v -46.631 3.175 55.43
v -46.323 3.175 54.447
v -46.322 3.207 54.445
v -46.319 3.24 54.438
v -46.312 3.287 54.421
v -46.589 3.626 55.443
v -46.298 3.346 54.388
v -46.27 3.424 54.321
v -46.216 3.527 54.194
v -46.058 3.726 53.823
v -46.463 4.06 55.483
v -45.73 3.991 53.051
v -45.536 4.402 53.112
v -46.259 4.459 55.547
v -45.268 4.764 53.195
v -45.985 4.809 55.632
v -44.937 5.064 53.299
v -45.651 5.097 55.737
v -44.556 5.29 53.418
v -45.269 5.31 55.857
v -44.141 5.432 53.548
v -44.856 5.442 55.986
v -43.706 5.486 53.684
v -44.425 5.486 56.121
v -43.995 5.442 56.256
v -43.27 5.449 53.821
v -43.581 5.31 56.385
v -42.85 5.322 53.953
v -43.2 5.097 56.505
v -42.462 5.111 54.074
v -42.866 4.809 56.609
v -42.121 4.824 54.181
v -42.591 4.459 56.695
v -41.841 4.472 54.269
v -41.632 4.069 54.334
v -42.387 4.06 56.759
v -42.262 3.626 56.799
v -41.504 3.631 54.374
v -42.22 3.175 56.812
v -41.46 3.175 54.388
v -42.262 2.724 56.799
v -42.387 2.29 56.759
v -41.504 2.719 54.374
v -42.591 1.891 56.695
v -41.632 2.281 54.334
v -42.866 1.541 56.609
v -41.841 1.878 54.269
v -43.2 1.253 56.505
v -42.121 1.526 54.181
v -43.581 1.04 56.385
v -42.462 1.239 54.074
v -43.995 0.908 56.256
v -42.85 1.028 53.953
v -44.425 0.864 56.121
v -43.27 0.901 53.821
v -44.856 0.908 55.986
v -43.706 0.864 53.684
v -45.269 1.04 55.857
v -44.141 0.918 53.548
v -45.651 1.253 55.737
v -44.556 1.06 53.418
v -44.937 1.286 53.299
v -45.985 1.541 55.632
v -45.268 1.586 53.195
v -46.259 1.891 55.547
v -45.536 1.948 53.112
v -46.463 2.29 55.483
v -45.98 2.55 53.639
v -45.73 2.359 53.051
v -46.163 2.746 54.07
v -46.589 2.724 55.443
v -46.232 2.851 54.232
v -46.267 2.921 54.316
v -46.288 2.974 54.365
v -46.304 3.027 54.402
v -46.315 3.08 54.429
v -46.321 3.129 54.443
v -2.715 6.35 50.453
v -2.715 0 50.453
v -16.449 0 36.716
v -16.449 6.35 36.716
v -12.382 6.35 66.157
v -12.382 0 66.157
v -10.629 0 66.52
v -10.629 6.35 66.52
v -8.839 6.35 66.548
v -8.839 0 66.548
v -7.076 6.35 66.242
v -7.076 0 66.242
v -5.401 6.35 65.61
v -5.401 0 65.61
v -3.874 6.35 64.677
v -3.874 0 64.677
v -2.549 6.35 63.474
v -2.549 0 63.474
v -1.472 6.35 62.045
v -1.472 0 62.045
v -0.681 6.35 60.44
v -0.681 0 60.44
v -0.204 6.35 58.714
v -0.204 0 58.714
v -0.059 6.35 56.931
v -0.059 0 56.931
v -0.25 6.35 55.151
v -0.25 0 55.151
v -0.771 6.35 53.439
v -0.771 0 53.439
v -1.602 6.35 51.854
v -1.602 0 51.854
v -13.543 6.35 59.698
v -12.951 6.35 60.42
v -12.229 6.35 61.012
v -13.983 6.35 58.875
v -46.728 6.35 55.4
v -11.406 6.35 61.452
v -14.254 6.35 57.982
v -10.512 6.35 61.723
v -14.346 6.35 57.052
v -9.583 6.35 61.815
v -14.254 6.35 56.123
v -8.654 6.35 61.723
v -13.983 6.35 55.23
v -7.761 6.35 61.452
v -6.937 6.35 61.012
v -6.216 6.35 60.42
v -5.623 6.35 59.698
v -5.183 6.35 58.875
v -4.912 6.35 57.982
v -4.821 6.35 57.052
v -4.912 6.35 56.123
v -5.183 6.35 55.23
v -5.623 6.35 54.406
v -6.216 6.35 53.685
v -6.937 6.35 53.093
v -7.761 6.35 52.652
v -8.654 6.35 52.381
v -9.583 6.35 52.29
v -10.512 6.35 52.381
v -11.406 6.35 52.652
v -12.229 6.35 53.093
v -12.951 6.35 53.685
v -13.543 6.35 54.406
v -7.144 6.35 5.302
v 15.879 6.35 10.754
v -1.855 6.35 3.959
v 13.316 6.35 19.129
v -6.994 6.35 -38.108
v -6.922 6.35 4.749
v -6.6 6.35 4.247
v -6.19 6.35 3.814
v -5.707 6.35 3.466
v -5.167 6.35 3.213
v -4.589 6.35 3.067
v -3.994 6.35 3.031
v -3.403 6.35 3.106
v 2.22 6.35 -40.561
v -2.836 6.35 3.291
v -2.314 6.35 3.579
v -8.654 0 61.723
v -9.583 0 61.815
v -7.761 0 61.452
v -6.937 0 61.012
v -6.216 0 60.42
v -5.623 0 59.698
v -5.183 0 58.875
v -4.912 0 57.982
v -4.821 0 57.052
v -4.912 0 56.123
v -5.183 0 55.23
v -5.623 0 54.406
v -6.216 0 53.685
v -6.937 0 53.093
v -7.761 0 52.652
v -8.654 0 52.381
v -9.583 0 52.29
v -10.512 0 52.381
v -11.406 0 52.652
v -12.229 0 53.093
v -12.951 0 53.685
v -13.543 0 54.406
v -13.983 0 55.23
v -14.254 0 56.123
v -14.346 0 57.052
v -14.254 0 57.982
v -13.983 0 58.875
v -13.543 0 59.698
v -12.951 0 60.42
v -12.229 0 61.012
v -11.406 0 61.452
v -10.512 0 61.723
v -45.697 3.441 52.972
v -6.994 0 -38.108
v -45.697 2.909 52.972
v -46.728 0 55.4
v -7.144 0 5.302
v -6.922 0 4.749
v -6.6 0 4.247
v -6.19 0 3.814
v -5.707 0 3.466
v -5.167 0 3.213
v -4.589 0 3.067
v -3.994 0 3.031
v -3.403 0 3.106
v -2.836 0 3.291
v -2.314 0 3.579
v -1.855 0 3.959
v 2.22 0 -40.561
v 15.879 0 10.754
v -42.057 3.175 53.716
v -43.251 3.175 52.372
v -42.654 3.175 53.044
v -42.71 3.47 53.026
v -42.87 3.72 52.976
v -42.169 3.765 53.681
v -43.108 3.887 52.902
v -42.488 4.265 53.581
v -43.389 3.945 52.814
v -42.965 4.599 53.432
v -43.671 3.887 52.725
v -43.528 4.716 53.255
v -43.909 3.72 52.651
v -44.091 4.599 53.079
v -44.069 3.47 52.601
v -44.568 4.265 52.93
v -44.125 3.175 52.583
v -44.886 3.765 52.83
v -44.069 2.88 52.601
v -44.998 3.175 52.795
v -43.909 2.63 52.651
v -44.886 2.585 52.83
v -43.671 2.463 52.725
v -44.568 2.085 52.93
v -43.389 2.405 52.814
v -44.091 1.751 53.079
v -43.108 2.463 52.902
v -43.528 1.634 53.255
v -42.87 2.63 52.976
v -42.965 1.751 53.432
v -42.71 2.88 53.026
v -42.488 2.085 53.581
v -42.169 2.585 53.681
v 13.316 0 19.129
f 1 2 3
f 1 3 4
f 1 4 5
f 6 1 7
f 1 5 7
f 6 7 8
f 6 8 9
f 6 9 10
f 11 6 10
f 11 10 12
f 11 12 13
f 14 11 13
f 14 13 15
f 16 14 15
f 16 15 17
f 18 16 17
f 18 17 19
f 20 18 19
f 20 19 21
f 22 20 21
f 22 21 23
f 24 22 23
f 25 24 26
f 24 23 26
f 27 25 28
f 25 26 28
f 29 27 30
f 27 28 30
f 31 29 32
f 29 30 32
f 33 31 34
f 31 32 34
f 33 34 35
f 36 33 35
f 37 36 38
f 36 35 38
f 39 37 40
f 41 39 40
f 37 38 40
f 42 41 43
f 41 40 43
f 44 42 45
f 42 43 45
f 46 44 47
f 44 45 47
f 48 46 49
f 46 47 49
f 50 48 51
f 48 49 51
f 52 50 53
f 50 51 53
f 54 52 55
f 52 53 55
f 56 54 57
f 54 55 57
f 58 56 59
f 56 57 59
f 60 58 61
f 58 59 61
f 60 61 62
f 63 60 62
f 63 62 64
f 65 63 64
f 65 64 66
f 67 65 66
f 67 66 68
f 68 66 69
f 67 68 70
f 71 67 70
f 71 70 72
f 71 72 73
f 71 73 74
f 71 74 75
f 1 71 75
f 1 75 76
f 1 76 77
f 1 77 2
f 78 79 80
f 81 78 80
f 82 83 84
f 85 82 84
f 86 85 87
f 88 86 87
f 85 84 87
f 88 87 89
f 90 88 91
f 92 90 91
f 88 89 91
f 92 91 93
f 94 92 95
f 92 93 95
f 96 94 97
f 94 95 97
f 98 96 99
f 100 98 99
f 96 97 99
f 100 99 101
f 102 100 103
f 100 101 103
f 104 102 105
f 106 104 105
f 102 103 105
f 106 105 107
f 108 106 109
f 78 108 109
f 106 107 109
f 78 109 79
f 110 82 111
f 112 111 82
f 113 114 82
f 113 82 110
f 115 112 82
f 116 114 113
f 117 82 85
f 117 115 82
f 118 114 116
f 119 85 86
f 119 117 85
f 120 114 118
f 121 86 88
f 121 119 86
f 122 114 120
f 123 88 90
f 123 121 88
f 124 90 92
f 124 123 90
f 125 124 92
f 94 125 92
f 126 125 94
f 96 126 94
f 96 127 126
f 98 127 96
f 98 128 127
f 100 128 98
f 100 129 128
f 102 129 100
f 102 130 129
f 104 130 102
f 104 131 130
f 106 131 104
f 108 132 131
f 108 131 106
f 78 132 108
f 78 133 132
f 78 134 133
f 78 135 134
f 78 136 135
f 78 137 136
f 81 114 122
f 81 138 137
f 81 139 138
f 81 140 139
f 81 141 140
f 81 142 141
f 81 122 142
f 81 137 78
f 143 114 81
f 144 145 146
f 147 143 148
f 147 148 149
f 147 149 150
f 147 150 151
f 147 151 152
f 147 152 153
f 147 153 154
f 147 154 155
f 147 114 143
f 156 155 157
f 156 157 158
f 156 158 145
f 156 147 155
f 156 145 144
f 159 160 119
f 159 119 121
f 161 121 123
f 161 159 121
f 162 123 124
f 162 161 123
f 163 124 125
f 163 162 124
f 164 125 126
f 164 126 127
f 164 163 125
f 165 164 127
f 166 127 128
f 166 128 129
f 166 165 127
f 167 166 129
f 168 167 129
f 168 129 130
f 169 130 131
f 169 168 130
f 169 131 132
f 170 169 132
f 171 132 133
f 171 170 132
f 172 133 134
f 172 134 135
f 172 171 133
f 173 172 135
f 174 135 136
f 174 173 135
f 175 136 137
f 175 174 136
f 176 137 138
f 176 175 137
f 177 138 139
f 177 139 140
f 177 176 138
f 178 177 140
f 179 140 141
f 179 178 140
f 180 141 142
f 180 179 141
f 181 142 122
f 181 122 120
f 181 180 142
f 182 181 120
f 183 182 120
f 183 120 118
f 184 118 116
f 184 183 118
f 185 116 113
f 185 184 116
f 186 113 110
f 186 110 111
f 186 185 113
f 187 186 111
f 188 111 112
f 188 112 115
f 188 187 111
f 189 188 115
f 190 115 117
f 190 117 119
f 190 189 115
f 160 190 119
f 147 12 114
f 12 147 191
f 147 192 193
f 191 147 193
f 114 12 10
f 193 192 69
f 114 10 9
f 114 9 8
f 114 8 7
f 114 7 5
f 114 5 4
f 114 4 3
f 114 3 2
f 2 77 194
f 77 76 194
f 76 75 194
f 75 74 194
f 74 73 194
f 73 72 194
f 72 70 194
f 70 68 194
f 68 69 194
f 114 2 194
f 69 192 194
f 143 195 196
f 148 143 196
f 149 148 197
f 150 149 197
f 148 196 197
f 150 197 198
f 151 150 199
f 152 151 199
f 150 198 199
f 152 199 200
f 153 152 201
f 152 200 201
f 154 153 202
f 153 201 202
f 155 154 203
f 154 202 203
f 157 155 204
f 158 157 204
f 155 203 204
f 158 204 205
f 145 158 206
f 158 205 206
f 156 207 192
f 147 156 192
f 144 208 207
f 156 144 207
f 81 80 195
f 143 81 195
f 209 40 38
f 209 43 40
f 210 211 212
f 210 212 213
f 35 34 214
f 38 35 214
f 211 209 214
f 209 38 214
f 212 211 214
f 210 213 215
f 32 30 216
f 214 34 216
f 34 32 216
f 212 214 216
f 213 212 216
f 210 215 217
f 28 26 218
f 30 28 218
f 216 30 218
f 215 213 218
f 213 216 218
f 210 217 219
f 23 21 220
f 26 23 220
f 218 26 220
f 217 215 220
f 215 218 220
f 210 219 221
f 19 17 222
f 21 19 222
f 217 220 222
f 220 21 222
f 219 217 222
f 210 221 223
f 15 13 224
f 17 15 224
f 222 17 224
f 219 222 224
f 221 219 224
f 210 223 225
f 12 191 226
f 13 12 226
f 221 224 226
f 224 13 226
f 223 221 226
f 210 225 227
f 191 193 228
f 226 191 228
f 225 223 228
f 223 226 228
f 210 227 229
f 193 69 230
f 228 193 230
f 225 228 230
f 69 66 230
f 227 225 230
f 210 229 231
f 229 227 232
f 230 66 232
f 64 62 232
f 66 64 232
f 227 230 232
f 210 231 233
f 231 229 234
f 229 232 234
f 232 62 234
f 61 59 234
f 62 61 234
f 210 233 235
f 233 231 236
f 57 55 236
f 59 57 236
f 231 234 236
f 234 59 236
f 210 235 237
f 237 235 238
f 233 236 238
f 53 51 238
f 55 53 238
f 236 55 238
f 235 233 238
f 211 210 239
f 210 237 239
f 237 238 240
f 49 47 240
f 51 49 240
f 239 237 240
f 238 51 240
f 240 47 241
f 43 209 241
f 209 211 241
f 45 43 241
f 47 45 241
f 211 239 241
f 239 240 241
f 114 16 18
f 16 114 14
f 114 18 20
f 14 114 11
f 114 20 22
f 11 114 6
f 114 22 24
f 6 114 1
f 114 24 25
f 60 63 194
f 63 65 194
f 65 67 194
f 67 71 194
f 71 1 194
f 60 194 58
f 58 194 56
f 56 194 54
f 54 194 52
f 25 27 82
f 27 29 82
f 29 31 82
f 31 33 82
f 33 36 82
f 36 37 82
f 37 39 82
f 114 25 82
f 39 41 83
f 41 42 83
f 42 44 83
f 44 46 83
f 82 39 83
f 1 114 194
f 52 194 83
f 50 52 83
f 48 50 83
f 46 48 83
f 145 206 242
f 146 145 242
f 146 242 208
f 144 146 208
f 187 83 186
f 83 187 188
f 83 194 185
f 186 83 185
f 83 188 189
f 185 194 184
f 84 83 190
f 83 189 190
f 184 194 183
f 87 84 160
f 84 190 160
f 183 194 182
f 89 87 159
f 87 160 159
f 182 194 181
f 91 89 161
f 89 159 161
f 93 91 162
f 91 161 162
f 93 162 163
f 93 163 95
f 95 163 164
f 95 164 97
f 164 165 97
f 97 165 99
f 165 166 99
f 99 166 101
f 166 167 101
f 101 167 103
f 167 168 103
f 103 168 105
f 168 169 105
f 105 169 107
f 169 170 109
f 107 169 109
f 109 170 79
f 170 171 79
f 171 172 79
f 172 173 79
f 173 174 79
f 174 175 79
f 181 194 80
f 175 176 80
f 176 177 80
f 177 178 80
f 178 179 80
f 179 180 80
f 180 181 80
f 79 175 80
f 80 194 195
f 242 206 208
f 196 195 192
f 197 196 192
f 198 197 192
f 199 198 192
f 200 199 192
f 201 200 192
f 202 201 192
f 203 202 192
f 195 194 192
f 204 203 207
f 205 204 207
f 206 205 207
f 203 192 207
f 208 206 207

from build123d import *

# Parameters (mm, degrees)
SKETCH1_R                       = 4.7625
BOSS_EXTRUDE1_DEPTH             = 6.35
F_14_0_182_DIAMETER_HOLE1_D     = 4.6228
F_14_0_182_DIAMETER_HOLE1_DEPTH = 2.54
F_14_0_182_DIAMETER_HOLE1_TIP   = 1.388829235


with BuildPart() as part:
    # Sketch1 → Boss-Extrude1 (new body)
    with BuildSketch(Plane(origin=(0, 0, 0), x_dir=(1, 0, 0), z_dir=(0, 1, 0))):
        with BuildLine():
            Line((-2.715472603, -50.452570894), (-16.449210706, -36.716165316))
            Line((-16.449210706, -36.716165316), (-7.143929399, -5.302062091))
            ThreePointArc((-7.143929399, -5.302062091), (-4.881213446, -3.126502672), (-1.85461271, -3.95874678))
            Line((-1.85461271, -3.95874678), (13.315573809, -19.128933299))
            Line((13.315573809, -19.128933299), (15.879471691, -10.753687697))
            Line((15.879471691, -10.753687697), (2.2197595, 40.561165667))
            Line((2.2197595, 40.561165667), (-6.994225827, 38.108456959))
            Line((-6.994225827, 38.108456959), (-46.728023778, -55.399752843))
            Line((-46.728023778, -55.399752843), (-12.38156047, -66.157106701))
            ThreePointArc((-12.38156047, -66.157106701), (-1.47172138, -62.045085351), (-2.715472603, -50.452570894))
        make_face()
        with Locations(Location((-9.583361485, -57.052398719, 0), (0, 0, 270))):
            Circle(SKETCH1_R, mode=Mode.SUBTRACT)
    extrude(amount=BOSS_EXTRUDE1_DEPTH)

    # #14 (0.182) Diameter Hole1
    with Locations(Plane(origin=(-19.975553156, 0, 63.778659005), x_dir=(0.9542892760421928, 0, 0.29888455569143674), z_dir=(-0.29888455569143674, 0, 0.9542892760421928))):
        with Locations((-25.620921468, 3.175)):
            Hole(F_14_0_182_DIAMETER_HOLE1_D / 2, depth=F_14_0_182_DIAMETER_HOLE1_DEPTH)
            with Locations((0, 0, -(F_14_0_182_DIAMETER_HOLE1_DEPTH + F_14_0_182_DIAMETER_HOLE1_TIP / 2))):  # 118° drill point
                Cone(0, F_14_0_182_DIAMETER_HOLE1_D / 2, F_14_0_182_DIAMETER_HOLE1_TIP, mode=Mode.SUBTRACT)


solid = part.part
